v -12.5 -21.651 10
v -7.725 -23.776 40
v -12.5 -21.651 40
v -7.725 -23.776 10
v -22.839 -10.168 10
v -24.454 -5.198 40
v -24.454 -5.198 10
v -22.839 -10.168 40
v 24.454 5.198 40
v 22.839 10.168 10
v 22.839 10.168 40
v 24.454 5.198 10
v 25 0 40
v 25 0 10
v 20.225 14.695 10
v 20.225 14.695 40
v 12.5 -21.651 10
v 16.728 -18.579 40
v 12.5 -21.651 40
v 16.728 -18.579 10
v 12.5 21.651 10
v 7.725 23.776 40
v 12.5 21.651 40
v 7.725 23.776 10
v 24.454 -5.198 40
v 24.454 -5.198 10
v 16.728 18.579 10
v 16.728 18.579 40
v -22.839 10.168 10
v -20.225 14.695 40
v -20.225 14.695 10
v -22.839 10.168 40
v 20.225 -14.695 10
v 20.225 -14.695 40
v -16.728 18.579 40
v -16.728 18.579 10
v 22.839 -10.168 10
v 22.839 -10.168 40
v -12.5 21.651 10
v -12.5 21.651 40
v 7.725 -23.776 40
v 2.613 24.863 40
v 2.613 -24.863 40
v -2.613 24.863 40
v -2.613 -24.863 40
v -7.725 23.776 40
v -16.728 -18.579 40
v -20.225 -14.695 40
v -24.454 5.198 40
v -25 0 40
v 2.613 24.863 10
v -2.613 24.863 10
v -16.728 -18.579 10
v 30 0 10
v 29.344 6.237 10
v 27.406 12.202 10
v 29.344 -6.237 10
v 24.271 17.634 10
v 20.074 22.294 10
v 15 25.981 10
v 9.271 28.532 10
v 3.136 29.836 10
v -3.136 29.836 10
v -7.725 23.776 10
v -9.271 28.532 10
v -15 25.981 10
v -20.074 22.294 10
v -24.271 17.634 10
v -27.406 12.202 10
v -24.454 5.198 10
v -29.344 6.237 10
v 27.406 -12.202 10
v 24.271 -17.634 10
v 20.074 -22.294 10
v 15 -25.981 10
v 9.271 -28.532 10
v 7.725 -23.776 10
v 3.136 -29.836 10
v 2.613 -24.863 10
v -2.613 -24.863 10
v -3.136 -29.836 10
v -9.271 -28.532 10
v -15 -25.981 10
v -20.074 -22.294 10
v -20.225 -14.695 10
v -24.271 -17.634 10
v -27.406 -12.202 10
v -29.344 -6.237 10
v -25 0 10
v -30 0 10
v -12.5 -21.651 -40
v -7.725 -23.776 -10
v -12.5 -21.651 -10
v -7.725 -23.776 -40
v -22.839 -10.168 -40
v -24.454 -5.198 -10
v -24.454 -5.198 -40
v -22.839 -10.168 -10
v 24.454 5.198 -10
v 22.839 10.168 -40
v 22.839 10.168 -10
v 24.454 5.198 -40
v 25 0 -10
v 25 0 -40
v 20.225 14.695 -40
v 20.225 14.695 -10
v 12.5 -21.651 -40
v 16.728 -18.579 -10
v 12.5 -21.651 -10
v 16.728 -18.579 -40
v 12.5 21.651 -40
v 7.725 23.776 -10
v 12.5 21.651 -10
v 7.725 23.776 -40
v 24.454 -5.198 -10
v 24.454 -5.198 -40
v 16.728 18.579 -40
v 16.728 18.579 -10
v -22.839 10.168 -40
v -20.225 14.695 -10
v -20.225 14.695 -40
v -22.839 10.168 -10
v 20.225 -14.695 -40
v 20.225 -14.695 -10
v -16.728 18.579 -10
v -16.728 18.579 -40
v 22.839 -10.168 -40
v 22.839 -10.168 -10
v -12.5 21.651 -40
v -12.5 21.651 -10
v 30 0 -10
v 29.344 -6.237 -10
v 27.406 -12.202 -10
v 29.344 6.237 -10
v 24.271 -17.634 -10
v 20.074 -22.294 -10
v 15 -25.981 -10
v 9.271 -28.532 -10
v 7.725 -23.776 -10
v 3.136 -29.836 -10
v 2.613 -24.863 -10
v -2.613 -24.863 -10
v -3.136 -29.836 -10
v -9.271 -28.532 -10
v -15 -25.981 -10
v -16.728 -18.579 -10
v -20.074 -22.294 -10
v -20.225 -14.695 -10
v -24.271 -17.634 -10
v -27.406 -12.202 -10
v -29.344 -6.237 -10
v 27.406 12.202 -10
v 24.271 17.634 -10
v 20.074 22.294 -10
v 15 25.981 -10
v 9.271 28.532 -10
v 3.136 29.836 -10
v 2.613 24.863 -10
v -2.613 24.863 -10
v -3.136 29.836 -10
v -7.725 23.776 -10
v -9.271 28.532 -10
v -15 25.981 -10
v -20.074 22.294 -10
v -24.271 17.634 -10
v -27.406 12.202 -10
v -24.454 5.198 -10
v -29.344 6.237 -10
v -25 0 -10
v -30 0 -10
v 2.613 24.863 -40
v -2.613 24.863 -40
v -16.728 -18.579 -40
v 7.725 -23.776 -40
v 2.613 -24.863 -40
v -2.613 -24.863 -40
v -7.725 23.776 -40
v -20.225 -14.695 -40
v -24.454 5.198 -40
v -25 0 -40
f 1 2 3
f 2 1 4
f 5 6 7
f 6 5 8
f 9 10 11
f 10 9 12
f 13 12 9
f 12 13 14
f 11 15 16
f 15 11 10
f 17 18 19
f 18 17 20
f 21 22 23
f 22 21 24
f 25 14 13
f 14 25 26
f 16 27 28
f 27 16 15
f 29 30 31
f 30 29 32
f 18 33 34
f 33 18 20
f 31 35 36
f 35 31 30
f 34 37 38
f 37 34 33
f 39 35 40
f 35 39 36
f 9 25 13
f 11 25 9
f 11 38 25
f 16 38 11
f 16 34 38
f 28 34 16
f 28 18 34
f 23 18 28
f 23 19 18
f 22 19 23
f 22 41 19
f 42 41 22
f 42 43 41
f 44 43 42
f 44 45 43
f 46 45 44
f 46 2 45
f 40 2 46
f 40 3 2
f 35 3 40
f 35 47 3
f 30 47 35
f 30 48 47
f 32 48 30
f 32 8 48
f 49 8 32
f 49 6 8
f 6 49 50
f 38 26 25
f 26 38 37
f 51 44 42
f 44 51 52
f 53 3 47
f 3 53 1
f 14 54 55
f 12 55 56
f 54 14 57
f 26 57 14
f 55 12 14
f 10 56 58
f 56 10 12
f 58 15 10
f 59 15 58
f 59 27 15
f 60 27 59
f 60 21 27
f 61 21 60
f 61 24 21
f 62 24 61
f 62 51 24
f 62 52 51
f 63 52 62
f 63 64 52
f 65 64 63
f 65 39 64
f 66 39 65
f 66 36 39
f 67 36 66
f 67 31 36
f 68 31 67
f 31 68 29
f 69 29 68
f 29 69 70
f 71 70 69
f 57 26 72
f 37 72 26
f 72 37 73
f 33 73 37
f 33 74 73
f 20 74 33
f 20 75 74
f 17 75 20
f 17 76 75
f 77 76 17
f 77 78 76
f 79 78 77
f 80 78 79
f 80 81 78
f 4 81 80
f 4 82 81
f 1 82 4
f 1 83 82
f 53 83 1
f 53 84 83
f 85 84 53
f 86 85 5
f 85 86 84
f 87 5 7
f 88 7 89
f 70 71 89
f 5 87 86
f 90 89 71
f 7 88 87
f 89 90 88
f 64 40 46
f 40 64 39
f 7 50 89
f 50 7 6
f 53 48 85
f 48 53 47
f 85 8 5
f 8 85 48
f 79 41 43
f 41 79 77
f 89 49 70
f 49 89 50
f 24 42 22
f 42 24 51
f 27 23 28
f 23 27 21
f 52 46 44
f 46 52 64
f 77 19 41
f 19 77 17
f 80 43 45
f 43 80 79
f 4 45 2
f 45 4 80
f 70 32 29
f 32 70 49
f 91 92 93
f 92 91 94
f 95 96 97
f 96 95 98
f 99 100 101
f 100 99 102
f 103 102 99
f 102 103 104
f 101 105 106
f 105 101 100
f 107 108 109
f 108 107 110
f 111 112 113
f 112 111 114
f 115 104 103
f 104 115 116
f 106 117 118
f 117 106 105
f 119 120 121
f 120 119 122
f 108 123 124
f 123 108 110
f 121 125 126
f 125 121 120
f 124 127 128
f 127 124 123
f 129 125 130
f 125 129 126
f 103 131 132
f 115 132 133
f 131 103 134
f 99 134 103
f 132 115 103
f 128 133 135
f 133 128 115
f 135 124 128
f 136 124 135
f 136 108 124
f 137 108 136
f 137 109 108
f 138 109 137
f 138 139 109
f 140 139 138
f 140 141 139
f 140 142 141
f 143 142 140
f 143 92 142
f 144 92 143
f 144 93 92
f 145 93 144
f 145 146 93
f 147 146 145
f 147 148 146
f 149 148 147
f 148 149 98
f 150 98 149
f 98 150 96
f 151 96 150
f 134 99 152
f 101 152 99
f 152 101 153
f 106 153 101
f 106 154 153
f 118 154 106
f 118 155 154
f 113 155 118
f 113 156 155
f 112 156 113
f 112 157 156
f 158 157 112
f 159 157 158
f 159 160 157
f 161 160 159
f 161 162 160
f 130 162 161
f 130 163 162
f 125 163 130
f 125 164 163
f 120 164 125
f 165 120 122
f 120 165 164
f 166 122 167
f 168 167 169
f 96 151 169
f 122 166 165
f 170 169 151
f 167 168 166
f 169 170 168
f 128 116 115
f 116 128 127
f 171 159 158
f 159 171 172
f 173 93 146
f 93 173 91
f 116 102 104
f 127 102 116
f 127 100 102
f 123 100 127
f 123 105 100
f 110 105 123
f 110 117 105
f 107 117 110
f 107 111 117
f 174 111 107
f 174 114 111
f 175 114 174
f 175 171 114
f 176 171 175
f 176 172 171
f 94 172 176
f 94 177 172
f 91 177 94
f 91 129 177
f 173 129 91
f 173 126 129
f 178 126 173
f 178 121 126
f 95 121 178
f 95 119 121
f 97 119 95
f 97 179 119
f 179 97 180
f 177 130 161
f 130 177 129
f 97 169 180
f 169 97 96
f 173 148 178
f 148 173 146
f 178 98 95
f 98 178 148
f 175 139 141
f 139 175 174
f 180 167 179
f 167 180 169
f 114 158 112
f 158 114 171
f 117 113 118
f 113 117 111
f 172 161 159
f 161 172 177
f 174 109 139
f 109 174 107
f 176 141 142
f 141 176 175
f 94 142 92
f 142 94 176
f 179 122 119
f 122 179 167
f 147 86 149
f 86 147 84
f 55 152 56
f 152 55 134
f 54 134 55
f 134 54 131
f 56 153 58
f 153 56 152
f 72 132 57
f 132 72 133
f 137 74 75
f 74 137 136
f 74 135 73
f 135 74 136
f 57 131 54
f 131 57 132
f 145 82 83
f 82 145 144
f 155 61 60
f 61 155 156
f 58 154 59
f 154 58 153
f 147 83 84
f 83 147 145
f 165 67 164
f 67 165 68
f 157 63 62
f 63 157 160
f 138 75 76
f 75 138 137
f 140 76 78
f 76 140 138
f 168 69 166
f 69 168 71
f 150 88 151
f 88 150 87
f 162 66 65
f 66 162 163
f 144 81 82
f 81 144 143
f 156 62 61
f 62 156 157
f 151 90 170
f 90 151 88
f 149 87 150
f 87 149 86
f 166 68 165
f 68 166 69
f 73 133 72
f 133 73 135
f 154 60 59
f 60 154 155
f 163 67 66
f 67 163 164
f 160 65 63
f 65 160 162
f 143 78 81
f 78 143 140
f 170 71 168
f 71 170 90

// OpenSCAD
// Parameters
shaft_diameter = 20;
shaft_length = 80; // Extended to ensure a clear central shaft
hub_diameter = 50;
hub_length = 30;
flange_diameter = 60;
flange_thickness = 5;
spacer_ring_thickness = 2;
bolt_diameter = 5;
bolt_length = 10; // Shortened bolts to match the original model
nut_diameter = 8;
nut_thickness = 4;
bolt_hole_radius = 25;
num_bolts = 4;

// Central Shaft
module central_shaft() {
    cylinder(d=shaft_diameter, h=shaft_length, center=true);
}

// Hub
module hub() {
    difference() {
        cylinder(d=hub_diameter, h=hub_length, center=true);
        cylinder(d=shaft_diameter, h=hub_length + 2, center=true);
    }
}

// Flange Plate
module flange_plate() {
    difference() {
        cylinder(d=flange_diameter, h=flange_thickness, center=true);
        cylinder(d=shaft_diameter, h=flange_thickness + 2, center=true);
        for (i = [0:num_bolts-1]) {
            angle = i * 360 / num_bolts;
            translate([bolt_hole_radius * cos(angle), bolt_hole_radius * sin(angle), 0])
                cylinder(d=bolt_diameter, h=flange_thickness + 2, center=true);
        }
    }
}

// Spacer Ring
module spacer_ring() {
    difference() {
        cylinder(d=flange_diameter, h=spacer_ring_thickness, center=true);
        cylinder(d=shaft_diameter, h=spacer_ring_thickness + 2, center=true);
        for (i = [0:num_bolts-1]) {
            angle = i * 360 / num_bolts;
            translate([bolt_hole_radius * cos(angle), bolt_hole_radius * sin(angle), 0])
                cylinder(d=bolt_diameter, h=spacer_ring_thickness + 2, center=true);
        }
    }
}

// Bolt
module bolt() {
    cylinder(d=bolt_diameter, h=bolt_length, center=true);
}

// Nut
module nut() {
    cylinder(d=nut_diameter, h=nut_thickness, center=true);
}

// Assembly
module coupling() {
    // Central Shaft
    central_shaft();
    
    // Left Hub
    translate([0, 0, shaft_length / 2 - hub_length / 2]) hub();
    
    // Right Hub
    translate([0, 0, -shaft_length / 2 + hub_length / 2]) hub();
    
    // Left Flange Plates and Spacer Ring
    translate([0, 0, shaft_length / 2 - hub_length - flange_thickness / 2]) flange_plate();
    translate([0, 0, shaft_length / 2 - hub_length - flange_thickness - spacer_ring_thickness / 2]) spacer_ring();
    translate([0, 0, shaft_length / 2 - hub_length - flange_thickness - spacer_ring_thickness - flange_thickness / 2]) flange_plate();
    
    // Right Flange Plates and Spacer Ring
    translate([0, 0, -shaft_length / 2 + hub_length + flange_thickness / 2]) flange_plate();
    translate([0, 0, -shaft_length / 2 + hub_length + flange_thickness + spacer_ring_thickness / 2]) spacer_ring();
    translate([0, 0, -shaft_length / 2 + hub_length + flange_thickness + spacer_ring_thickness + flange_thickness / 2]) flange_plate();
    
    // Bolts and Nuts
    for (i = [0:num_bolts-1]) {
        angle = i * 360 / num_bolts;
        
        // Left Side Bolts
        translate([bolt_hole_radius * cos(angle), bolt_hole_radius * sin(angle), shaft_length / 2 - hub_length - flange_thickness])
            bolt();
        translate([bolt_hole_radius * cos(angle), bolt_hole_radius * sin(angle), shaft_length / 2 - hub_length - flange_thickness - bolt_length / 2])
            nut();
        
        // Right Side Bolts
        translate([bolt_hole_radius * cos(angle), bolt_hole_radius * sin(angle), -shaft_length / 2 + hub_length + flange_thickness])
            bolt();
        translate([bolt_hole_radius * cos(angle), bolt_hole_radius * sin(angle), -shaft_length / 2 + hub_length + flange_thickness + bolt_length / 2])
            nut();
    }
}

coupling();
